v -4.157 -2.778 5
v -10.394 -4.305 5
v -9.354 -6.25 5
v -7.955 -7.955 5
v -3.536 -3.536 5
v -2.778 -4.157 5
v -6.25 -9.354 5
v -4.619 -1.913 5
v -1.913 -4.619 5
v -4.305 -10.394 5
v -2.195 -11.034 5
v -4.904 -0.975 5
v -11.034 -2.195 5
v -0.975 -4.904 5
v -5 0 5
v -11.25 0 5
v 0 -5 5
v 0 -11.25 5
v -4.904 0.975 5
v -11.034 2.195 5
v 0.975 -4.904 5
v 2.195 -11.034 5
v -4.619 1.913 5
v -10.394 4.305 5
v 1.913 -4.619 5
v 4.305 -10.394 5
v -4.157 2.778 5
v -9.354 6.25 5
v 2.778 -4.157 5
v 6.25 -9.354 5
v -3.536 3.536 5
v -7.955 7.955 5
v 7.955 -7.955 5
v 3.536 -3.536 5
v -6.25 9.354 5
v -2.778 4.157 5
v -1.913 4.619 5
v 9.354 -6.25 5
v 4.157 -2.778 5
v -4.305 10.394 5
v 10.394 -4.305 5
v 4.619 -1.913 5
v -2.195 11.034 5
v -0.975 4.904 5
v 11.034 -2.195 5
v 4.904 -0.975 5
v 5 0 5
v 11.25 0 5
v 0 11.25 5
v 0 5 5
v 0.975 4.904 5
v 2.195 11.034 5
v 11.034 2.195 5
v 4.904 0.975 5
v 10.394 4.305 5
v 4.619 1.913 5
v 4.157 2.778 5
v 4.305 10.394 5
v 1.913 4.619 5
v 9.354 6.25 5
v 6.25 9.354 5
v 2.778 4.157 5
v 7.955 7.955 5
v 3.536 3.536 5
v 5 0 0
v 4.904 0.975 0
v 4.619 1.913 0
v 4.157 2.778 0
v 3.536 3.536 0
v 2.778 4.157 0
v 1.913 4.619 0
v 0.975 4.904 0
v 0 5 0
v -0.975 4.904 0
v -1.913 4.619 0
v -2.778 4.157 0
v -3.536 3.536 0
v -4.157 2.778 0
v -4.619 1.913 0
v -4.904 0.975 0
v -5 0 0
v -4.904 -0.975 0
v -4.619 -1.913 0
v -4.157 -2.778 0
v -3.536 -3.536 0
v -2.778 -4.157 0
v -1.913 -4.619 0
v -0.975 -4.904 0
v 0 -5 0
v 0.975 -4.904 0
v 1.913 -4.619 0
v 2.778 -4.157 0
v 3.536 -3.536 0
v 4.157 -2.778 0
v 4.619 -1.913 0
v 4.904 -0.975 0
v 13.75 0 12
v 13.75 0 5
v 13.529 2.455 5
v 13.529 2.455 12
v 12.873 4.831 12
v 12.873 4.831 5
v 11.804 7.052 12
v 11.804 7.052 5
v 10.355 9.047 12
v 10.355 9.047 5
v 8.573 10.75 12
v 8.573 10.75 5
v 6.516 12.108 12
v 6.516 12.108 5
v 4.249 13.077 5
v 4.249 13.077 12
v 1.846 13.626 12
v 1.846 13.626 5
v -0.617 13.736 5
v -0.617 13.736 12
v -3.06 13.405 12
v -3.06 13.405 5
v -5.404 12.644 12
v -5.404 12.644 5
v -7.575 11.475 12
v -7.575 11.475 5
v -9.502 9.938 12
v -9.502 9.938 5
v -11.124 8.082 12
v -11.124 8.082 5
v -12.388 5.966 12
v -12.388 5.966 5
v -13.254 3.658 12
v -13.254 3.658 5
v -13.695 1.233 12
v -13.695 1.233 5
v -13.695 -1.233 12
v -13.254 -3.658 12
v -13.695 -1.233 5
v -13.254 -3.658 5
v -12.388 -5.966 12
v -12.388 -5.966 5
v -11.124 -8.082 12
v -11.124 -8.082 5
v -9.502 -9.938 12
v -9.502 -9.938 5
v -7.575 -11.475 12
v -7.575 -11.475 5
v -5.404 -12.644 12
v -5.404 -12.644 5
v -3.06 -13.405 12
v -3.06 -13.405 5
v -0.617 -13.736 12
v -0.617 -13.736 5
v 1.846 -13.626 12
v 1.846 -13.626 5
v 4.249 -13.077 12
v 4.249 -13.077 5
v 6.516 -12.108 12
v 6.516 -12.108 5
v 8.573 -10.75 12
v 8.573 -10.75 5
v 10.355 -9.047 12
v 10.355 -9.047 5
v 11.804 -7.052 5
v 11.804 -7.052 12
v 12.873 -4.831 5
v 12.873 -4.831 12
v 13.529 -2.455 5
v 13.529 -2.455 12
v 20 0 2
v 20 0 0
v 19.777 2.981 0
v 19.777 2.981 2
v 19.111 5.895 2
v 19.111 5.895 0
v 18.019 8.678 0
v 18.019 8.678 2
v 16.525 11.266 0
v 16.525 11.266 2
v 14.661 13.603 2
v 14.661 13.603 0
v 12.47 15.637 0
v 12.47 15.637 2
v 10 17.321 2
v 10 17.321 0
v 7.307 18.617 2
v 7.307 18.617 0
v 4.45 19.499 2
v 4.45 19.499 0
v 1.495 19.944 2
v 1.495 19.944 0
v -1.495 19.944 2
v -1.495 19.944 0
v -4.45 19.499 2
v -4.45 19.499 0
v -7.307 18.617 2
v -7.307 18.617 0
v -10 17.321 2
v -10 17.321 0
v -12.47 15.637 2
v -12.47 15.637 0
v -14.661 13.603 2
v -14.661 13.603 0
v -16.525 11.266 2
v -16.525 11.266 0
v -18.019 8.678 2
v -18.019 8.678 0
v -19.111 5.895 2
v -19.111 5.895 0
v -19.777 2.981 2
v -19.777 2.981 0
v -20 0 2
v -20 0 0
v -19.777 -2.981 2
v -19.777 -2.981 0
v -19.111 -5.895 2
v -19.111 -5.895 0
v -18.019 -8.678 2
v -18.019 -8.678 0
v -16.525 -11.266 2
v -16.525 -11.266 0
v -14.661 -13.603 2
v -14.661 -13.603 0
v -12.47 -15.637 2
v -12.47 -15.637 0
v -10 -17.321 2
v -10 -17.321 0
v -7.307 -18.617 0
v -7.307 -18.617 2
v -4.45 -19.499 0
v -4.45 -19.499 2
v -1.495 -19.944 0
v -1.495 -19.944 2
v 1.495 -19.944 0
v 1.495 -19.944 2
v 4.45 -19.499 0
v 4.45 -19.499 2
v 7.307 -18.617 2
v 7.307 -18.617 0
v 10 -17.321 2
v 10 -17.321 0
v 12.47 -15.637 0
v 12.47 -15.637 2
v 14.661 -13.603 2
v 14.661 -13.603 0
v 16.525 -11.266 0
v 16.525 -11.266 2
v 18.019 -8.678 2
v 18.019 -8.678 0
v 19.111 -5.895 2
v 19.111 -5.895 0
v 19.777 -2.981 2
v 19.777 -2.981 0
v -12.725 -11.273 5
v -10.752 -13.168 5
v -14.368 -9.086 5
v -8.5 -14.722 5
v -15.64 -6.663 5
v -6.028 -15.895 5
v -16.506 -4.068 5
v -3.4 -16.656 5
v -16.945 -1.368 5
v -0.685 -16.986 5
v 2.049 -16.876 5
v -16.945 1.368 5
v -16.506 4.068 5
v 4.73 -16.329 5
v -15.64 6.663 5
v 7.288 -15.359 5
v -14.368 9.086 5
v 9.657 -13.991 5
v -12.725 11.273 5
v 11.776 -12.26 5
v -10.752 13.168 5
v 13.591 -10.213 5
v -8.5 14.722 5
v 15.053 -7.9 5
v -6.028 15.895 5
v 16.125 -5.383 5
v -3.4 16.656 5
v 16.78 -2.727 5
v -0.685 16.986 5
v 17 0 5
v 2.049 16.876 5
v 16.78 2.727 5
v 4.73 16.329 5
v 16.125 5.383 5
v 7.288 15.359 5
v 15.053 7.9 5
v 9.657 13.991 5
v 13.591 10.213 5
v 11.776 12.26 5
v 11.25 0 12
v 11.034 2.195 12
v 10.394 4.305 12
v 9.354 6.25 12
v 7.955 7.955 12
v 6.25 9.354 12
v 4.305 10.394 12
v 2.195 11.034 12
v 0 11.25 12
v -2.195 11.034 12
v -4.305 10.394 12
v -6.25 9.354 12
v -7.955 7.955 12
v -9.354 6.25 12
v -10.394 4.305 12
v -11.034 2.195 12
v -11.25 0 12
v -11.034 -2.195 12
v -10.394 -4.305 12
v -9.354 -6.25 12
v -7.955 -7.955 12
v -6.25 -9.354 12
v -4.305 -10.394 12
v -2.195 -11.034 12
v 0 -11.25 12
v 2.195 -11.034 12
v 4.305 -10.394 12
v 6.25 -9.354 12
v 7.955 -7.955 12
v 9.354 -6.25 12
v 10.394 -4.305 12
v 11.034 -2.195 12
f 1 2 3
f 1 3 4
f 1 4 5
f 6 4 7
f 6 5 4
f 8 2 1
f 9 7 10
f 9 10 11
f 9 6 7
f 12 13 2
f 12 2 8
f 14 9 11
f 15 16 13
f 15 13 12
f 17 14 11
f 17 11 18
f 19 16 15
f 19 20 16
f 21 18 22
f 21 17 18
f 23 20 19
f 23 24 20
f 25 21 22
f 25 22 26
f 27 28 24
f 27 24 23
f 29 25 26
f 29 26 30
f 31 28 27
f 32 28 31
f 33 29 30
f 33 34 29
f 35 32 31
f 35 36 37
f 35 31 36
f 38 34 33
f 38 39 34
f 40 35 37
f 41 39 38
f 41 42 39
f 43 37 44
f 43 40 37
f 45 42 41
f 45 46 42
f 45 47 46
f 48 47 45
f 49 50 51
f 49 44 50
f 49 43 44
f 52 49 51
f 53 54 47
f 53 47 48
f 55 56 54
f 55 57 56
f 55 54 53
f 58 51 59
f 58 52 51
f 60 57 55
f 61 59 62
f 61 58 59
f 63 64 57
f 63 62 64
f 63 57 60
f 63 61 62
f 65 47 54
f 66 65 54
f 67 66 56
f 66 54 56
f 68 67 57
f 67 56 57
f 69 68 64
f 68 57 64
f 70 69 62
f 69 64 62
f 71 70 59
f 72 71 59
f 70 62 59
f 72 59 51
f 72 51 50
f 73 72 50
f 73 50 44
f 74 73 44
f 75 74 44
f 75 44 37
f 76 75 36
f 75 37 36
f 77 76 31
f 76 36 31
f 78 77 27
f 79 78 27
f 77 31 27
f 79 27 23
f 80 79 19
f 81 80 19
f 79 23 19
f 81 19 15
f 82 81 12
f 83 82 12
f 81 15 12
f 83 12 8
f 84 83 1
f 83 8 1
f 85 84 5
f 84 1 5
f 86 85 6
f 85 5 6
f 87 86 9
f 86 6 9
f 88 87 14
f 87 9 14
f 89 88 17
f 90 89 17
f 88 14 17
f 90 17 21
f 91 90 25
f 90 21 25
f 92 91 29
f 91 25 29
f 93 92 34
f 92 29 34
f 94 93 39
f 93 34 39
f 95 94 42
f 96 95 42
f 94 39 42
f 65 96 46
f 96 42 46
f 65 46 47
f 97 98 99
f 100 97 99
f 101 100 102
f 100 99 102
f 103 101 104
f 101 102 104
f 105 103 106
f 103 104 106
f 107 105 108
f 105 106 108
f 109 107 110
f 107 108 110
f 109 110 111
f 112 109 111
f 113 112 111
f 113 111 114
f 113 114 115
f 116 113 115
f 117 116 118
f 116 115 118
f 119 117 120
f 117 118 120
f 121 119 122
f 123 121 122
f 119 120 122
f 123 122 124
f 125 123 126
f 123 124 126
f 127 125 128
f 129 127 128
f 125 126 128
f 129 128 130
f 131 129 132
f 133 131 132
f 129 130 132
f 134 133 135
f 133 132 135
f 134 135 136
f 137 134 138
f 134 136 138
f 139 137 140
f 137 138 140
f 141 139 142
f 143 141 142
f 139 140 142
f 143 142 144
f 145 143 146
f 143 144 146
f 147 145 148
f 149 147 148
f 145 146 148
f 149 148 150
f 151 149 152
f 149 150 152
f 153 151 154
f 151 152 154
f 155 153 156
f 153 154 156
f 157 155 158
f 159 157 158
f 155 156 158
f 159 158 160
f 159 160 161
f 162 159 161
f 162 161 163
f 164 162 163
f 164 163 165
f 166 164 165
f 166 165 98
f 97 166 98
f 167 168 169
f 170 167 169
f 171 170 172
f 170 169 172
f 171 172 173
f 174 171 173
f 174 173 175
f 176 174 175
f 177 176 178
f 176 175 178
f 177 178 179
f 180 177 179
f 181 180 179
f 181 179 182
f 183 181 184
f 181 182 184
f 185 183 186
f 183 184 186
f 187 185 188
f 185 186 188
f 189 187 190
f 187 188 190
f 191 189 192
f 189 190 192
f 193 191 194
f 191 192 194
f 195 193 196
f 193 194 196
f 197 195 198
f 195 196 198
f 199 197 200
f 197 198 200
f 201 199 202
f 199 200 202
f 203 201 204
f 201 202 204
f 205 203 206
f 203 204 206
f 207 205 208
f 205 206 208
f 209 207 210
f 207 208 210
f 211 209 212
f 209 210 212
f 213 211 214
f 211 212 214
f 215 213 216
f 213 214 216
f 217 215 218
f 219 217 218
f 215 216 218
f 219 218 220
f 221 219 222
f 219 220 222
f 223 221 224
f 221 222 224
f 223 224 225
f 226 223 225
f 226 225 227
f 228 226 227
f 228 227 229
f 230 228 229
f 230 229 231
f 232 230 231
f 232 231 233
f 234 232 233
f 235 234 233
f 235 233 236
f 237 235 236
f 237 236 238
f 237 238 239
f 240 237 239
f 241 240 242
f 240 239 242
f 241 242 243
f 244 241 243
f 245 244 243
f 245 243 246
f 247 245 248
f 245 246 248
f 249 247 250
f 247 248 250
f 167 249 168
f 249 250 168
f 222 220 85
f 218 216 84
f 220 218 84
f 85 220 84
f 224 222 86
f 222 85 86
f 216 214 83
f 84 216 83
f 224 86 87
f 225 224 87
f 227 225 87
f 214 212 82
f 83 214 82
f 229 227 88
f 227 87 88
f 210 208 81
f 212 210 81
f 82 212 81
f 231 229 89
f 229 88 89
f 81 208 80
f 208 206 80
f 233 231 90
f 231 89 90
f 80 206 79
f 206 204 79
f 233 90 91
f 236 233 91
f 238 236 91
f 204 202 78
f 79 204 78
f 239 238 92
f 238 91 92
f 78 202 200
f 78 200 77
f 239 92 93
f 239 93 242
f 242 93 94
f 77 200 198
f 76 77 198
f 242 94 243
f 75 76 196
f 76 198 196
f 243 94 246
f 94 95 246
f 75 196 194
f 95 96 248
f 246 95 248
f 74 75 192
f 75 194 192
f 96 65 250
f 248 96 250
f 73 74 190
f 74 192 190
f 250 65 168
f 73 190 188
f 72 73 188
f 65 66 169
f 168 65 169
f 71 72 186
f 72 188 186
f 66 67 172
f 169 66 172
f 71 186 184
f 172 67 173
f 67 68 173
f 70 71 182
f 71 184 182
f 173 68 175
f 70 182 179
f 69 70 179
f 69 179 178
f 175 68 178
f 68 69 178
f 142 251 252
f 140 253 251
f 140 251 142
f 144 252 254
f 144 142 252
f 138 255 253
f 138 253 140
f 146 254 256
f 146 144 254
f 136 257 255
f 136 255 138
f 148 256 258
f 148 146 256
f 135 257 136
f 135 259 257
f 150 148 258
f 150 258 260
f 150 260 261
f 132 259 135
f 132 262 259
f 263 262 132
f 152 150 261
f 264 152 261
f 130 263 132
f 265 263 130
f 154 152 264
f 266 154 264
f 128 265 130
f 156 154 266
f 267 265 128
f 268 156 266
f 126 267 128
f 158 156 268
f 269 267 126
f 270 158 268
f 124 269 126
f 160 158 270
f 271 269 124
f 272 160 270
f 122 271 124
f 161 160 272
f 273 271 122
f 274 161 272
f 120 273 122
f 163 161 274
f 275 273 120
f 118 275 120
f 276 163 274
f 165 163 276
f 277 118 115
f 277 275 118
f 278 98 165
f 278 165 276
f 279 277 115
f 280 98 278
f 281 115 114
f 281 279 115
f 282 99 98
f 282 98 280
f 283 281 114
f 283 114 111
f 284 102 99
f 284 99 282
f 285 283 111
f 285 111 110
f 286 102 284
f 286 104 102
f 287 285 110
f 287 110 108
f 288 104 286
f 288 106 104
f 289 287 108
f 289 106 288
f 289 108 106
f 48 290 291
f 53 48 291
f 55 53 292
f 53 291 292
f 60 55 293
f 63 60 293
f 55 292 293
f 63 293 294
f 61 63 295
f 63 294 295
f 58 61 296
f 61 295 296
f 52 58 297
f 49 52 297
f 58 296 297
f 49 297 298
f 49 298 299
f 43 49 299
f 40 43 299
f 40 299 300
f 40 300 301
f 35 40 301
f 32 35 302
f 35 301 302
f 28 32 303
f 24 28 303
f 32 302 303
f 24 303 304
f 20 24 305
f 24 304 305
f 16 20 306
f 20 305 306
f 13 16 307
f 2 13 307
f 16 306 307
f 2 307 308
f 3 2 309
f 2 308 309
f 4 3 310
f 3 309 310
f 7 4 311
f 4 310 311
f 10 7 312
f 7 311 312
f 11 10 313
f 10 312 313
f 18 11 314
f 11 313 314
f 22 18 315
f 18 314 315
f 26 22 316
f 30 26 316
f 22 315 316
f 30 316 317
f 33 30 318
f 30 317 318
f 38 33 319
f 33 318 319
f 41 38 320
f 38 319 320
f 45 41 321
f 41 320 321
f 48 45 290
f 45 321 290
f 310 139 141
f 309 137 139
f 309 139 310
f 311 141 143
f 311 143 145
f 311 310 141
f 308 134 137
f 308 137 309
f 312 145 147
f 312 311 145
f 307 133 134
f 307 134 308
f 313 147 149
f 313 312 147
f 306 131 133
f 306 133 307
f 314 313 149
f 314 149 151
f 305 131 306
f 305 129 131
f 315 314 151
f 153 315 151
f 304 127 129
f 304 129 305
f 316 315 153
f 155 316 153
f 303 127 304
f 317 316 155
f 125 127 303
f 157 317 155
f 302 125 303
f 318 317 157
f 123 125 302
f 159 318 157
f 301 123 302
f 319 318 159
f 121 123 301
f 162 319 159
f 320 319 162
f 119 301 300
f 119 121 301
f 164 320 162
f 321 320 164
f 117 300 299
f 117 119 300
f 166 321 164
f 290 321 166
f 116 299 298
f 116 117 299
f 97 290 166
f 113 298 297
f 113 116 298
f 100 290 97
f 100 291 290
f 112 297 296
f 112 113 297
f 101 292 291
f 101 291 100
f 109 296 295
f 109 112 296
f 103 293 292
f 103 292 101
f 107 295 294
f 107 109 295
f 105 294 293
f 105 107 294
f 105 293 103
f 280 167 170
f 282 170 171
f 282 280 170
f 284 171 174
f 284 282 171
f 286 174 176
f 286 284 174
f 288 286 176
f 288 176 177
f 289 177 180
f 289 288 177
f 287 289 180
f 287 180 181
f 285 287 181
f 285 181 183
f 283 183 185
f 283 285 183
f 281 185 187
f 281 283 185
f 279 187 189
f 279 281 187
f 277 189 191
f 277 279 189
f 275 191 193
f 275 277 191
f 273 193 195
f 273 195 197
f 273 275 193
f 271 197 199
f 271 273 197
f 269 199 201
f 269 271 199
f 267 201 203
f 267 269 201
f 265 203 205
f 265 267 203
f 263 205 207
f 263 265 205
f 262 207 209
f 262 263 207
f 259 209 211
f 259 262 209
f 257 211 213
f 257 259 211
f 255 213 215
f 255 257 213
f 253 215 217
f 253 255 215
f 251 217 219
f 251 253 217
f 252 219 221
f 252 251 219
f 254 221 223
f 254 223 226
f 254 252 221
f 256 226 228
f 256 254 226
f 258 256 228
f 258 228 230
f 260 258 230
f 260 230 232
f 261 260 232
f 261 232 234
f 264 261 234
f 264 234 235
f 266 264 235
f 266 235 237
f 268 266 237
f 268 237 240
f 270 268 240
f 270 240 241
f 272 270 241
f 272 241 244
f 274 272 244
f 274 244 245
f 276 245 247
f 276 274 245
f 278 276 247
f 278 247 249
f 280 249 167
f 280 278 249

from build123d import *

# Parameters (mm, degrees)
F0_R     = 20
F1_DEPTH = 5
F2_R     = 13.75
F3_DEPTH = 7
F5_SIZE  = 3
F4_R     = 11.25
F6_DEPTH = 7
F7_R     = 5
F8_DEPTH = 5


with BuildPart() as f1:
    # F0 (on Top) → F1 (new body)
    with BuildSketch(Plane.XY):
        Circle(F0_R)
    extrude(amount=F1_DEPTH)

    # F2 (on face) → F3 (join)
    with BuildSketch(Plane.XY.offset(5)):
        Circle(F2_R)
    extrude(amount=F3_DEPTH)

    # F5
    f5_edges = [f1.edges().sort_by_distance(p)[0] for p in [
        (-20, 0, 5),
    ]]
    chamfer(f5_edges, length=F5_SIZE)

    # F4 (on face) → F6 (cut)
    with BuildSketch(Plane.XY.offset(12)):
        Circle(F4_R)
    extrude(amount=-F6_DEPTH, mode=Mode.SUBTRACT)

    # F7 (on face) → F8 (cut, through all)
    with BuildSketch(Plane.XY.offset(5)):
        Circle(F7_R)
    extrude(amount=-F8_DEPTH, mode=Mode.SUBTRACT)


solid = f1.part
